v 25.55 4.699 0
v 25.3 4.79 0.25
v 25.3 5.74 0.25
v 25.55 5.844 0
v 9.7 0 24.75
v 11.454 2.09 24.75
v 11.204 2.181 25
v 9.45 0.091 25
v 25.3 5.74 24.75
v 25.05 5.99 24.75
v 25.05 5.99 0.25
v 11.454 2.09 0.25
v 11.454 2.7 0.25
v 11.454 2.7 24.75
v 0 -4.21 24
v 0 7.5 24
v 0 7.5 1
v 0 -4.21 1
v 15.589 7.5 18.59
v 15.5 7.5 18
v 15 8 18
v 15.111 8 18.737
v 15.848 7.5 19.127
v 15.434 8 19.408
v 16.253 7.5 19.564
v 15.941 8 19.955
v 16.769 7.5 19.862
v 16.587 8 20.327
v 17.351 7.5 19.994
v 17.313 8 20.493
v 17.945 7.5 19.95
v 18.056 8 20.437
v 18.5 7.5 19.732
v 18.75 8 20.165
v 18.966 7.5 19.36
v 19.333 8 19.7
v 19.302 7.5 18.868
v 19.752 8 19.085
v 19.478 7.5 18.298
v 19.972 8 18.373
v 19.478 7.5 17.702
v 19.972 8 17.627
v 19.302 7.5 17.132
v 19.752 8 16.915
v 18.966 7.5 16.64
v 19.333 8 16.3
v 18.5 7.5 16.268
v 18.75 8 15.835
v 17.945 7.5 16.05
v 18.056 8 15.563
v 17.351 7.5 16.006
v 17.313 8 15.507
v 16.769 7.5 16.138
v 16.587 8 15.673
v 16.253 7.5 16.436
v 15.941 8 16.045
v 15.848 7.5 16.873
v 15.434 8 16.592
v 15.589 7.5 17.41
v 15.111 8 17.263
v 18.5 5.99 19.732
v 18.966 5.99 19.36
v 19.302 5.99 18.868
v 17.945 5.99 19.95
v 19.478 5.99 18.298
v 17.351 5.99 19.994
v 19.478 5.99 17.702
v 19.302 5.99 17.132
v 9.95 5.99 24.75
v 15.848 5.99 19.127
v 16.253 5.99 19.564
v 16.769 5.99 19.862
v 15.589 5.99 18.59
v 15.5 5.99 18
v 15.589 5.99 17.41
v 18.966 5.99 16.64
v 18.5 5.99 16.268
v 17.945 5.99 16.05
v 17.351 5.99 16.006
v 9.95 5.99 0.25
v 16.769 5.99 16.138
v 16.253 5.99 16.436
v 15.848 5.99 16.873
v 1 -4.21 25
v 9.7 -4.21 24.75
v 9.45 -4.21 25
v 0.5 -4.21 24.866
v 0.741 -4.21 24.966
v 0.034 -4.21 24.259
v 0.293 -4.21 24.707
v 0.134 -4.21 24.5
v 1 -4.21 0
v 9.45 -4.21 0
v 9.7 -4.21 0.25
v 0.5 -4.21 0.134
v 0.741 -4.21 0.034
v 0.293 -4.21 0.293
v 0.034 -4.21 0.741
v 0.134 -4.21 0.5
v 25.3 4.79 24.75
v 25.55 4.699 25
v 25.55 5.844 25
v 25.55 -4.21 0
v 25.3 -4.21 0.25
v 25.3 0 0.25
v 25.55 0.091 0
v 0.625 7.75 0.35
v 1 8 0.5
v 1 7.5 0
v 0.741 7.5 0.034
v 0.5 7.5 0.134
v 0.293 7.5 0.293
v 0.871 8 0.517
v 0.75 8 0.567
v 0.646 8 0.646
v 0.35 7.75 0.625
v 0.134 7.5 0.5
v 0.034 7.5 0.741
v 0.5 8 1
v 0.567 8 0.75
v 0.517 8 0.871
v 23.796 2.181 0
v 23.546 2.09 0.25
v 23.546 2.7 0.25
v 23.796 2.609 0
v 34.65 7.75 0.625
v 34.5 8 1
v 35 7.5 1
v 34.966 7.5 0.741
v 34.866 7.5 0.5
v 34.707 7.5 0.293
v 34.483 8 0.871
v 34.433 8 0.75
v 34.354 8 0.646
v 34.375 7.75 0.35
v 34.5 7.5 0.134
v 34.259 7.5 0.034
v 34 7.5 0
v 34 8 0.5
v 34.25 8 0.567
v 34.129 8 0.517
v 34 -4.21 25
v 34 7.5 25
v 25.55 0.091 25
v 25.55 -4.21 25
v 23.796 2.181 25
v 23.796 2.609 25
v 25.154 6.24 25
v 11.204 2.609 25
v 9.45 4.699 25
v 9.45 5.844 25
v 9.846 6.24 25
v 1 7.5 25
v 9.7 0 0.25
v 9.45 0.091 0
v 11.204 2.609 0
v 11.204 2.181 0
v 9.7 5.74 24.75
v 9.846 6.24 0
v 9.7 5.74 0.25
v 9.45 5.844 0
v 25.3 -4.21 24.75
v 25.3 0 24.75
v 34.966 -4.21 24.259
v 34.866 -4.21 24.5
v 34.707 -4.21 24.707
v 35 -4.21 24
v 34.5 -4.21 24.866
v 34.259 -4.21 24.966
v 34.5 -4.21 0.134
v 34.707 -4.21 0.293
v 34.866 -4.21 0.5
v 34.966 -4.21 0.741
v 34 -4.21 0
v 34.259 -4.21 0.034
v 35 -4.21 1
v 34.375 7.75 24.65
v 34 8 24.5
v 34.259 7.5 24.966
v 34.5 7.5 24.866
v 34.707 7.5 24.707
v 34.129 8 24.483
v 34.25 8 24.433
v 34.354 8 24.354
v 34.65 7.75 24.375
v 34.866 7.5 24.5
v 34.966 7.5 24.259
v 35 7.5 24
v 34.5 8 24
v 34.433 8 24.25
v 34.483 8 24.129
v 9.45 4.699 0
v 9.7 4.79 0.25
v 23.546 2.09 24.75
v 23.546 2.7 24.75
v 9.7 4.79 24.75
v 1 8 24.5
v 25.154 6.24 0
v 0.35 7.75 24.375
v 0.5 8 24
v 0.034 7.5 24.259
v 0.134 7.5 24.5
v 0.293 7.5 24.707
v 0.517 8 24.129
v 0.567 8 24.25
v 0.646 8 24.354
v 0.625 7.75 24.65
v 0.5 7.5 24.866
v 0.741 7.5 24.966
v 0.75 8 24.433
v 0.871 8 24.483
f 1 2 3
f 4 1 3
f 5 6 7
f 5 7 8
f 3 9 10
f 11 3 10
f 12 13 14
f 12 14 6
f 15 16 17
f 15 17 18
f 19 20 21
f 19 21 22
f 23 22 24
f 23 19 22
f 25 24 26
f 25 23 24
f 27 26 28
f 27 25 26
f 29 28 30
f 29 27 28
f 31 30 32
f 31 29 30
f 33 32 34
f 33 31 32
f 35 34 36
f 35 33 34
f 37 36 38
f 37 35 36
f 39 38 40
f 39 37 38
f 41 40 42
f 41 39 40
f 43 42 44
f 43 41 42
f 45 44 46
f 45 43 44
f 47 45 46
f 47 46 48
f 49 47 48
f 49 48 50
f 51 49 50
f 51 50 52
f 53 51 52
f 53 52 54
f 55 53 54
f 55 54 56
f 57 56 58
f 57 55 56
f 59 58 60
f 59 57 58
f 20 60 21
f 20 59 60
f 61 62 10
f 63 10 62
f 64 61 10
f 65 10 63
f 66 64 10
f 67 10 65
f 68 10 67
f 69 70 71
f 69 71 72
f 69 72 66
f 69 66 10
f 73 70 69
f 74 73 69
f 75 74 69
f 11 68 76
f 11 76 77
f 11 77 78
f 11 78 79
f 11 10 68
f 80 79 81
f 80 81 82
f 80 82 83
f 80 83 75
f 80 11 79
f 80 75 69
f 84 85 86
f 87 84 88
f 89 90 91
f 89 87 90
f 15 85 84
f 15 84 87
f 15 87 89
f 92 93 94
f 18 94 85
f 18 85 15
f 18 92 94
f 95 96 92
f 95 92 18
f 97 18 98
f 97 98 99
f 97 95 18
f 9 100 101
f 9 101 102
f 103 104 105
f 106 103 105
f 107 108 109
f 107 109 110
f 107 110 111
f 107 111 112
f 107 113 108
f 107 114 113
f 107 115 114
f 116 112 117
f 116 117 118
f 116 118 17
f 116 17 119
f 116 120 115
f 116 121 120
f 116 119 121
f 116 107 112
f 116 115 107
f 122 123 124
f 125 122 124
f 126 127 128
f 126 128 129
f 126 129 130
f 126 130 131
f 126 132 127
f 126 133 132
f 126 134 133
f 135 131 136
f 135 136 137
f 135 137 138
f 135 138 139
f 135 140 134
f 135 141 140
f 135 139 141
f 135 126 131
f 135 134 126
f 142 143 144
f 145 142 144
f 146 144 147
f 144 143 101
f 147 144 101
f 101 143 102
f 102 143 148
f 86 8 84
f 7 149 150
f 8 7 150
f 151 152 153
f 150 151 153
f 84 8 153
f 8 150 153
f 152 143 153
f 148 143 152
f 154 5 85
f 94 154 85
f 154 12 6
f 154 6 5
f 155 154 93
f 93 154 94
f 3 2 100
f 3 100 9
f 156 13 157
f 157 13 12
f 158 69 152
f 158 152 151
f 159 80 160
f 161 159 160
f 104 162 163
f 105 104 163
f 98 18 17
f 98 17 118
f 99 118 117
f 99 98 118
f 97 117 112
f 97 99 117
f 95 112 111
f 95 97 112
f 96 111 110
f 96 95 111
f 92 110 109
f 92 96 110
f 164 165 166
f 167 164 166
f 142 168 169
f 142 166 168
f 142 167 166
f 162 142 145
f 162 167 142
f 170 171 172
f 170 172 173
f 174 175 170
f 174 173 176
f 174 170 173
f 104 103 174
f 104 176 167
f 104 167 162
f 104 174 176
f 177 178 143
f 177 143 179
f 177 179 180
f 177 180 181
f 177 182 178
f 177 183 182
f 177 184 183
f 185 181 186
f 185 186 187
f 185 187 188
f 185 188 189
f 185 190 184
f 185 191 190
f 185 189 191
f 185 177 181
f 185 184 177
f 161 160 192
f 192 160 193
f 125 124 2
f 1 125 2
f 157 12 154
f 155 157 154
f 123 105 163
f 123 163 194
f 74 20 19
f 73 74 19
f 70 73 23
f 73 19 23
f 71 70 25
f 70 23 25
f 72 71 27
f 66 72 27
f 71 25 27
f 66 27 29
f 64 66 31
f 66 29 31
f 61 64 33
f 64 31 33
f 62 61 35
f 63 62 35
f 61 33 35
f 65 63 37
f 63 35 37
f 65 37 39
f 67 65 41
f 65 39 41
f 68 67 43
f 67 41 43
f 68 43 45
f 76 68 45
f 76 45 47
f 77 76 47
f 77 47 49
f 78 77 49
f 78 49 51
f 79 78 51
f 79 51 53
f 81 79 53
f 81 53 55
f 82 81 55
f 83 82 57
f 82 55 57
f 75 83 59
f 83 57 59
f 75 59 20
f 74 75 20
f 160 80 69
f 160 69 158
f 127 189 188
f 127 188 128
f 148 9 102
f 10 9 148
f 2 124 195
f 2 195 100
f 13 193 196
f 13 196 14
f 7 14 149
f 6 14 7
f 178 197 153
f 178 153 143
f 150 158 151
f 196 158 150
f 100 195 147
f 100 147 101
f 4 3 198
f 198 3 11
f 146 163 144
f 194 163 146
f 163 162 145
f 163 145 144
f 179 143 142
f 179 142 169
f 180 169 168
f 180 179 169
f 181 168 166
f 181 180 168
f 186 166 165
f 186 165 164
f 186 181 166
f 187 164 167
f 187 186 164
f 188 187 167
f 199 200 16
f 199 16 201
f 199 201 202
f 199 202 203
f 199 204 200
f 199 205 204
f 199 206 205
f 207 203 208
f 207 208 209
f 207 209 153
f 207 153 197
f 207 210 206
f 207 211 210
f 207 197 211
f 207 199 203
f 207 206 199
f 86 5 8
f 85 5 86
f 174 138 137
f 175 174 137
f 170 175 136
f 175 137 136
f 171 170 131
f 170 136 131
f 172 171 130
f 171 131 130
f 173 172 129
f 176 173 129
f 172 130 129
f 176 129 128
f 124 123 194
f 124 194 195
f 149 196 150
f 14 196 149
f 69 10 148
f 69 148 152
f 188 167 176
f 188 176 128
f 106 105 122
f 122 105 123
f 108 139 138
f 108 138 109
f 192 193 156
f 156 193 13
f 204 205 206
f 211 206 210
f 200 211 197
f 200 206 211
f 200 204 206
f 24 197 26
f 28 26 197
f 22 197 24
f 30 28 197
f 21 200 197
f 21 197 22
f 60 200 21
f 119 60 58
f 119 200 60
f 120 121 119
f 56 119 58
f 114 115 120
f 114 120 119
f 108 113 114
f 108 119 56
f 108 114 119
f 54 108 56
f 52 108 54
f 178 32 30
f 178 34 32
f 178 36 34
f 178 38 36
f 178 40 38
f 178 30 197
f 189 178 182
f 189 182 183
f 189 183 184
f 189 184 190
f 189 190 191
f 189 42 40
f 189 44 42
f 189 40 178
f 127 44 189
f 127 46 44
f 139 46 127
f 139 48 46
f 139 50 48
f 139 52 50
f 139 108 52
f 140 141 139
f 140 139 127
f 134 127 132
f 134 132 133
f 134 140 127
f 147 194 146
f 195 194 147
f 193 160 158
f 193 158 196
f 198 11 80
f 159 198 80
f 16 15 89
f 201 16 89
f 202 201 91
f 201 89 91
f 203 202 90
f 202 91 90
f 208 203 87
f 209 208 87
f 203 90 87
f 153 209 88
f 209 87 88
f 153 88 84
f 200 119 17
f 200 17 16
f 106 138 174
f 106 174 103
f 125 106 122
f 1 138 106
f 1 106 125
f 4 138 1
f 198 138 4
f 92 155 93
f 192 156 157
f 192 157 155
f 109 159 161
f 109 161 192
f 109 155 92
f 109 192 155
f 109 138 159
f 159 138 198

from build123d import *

# Parameters (mm, degrees)
P_IDAT_VYSUNUT_M1_DEPTH  = 25
SKICA2_R                 = 2
ODEBRAT_VYSUNUT_M1_DEPTH = 2.01
ZAOBLIT1_R               = 1
ZKOSEN_4_SIZE            = 0.25
ZKOSEN_5_SIZE            = 0.5
ZKOSEN_6_SIZE            = 0.5


with BuildPart() as part:
    # Skica1 → Přidat vysunutím1 (new body)
    with BuildSketch(Plane.XY):
        Polygon((0, 0), (0, 8), (35, 8), (35, 0), (35, -4.21), (25.3, -4.21), (25.3, 0), (23.546281771, 2.09), (23.546281771, 2.7), (25.3, 4.79), (25.3, 5.74), (25.05, 5.99), (9.95, 5.99), (9.7, 5.74), (9.7, 4.79), (11.453718229, 2.7), (11.453718229, 2.09), (9.7, 0), (9.7, -4.21), (0, -4.21), align=None)
    extrude(amount=P_IDAT_VYSUNUT_M1_DEPTH)

    # Skica2 → Odebrat vysunutím1 (cut)
    with BuildSketch(Plane(origin=(0, 8, 0), x_dir=(1, 0, 0), z_dir=(0, 1, 0))):
        with Locations(Location((17.5, -18, 0), (0, 0, 180))):
            Circle(SKICA2_R)
    extrude(amount=-ODEBRAT_VYSUNUT_M1_DEPTH, mode=Mode.SUBTRACT)

    # Zaoblit1
    zaoblit1_edges = [part.edges().sort_by_distance(p)[0] for p in [
        (0, 1.895, 0),
        (35, 1.895, 0),
        (0, 1.895, 25),
        (35, 1.895, 25),
    ]]
    fillet(zaoblit1_edges, radius=ZAOBLIT1_R)

    # Zkosení4
    zkosen_4_edges = [part.edges().sort_by_distance(p)[0] for p in [
        (9.7, -2.105, 25),
        (10.576859115, 1.045, 25),
        (11.453718229, 2.395, 25),
        (25.3, -2.105, 0),
        (24.423140885, 1.045, 0),
        (23.546281771, 2.395, 0),
        (24.423140885, 3.745, 0),
        (25.3, 5.265, 0),
        (25.175, 5.865, 0),
        (17.5, 5.99, 0),
        (9.825, 5.865, 0),
        (9.7, 5.265, 0),
        (10.576859115, 3.745, 25),
        (10.576859115, 3.745, 0),
        (11.453718229, 2.395, 0),
        (10.576859115, 1.045, 0),
        (9.7, -2.105, 0),
        (9.7, 5.265, 25),
        (9.825, 5.865, 25),
        (17.5, 5.99, 25),
        (25.175, 5.865, 25),
        (25.3, 5.265, 25),
        (24.423140885, 3.745, 25),
        (23.546281771, 2.395, 25),
        (24.423140885, 1.045, 25),
        (25.3, -2.105, 25),
    ]]
    chamfer(zkosen_4_edges, length=ZKOSEN_4_SIZE)

    # Zkosení5
    zkosen_5_edges = [part.edges().sort_by_distance(p)[0] for p in [
        (17.5, 8, 25),
        (17.5, 8, 0),
        (0, 8, 12.5),
        (35, 8, 12.5),
        (0.292893219, 8, 24.707106781),
        (0.292893219, 8, 0.292893219),
        (34.707106781, 8, 0.292893219),
        (34.707106781, 8, 24.707106781),
    ]]
    chamfer(zkosen_5_edges, length=ZKOSEN_5_SIZE)

    # Zkosení6
    zkosen_6_edges = [part.edges().sort_by_distance(p)[0] for p in [
        (19.5, 8, 18),
    ]]
    chamfer(zkosen_6_edges, length=ZKOSEN_6_SIZE)


solid = part.part
